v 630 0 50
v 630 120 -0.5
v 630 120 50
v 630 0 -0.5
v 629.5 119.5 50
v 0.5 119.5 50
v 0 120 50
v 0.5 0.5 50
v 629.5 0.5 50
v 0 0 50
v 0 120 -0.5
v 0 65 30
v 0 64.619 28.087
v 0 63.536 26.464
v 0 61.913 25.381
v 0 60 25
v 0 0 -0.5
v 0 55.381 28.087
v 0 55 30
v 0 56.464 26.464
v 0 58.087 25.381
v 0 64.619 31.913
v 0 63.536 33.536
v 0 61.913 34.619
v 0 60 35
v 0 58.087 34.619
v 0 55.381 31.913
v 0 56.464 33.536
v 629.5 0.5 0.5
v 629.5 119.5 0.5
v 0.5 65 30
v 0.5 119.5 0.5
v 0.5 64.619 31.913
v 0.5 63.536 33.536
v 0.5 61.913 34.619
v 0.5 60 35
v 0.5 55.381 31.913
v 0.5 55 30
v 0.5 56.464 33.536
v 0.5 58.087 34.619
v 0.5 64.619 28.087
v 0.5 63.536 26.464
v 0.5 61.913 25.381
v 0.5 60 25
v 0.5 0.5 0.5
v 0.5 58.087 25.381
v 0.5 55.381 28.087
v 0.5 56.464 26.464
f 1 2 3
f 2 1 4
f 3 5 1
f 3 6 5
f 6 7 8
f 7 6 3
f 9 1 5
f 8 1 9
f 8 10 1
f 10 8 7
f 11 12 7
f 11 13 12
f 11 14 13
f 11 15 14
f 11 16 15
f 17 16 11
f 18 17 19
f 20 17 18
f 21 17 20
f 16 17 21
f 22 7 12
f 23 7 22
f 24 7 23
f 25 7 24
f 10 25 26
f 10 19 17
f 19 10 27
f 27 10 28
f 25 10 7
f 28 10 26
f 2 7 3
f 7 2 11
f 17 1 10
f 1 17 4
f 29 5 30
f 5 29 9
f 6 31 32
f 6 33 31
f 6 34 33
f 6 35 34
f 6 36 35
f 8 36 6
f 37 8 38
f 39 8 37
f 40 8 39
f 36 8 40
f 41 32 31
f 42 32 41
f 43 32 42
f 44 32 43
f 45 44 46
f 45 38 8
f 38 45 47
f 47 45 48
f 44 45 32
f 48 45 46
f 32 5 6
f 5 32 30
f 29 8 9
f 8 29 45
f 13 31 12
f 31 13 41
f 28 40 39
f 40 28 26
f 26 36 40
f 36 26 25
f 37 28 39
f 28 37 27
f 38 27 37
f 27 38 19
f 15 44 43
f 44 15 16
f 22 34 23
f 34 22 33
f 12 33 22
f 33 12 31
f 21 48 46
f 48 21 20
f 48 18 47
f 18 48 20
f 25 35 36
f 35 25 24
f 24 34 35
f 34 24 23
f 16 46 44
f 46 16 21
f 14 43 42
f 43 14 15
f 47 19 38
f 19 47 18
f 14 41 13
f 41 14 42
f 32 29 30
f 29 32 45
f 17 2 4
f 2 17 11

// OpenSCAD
BoxTopLength=197;
BoxTopWidth=197;
BoxHeight=190;
LipHeight=4;
LipThickness=2;
LipOverHangWidth=25;
BoxTopThickness=2;
BoxThickness=2;
IsOpenTop=true;



//meshX=26;
meshY=18;
meshZ=40;
Seedrows=4;
Seedcolumns=4;

spokeCount=24;
spokerows=8;
spokeDia=15;
spokeY=2;
wallWidth=2;


module Box(x,y,wall, height)
{
    //resize([0,0,0]) 
    translate([x/2,y/2,0]) 
    cube([x,y,wall],true);
    difference()
    {
    BoxWalls(x,y,wall,height);
    color("blue") translate([-5,y/2,height-(meshZ/2)])
    rotate(a=180, v=[1,0,1]) cylinder(20,5,5, false);
    }
    
}

module BoxWalls(x,y,wall, height)
{
     translate([x/2,y/2,height/2]) difference()
    {
    cube([x,y,height],true);
    cube([x-wall,y-wall,height+1], true);
    }
}

module drawTray()
{

Box(630,120,1,50);
}

drawTray();
